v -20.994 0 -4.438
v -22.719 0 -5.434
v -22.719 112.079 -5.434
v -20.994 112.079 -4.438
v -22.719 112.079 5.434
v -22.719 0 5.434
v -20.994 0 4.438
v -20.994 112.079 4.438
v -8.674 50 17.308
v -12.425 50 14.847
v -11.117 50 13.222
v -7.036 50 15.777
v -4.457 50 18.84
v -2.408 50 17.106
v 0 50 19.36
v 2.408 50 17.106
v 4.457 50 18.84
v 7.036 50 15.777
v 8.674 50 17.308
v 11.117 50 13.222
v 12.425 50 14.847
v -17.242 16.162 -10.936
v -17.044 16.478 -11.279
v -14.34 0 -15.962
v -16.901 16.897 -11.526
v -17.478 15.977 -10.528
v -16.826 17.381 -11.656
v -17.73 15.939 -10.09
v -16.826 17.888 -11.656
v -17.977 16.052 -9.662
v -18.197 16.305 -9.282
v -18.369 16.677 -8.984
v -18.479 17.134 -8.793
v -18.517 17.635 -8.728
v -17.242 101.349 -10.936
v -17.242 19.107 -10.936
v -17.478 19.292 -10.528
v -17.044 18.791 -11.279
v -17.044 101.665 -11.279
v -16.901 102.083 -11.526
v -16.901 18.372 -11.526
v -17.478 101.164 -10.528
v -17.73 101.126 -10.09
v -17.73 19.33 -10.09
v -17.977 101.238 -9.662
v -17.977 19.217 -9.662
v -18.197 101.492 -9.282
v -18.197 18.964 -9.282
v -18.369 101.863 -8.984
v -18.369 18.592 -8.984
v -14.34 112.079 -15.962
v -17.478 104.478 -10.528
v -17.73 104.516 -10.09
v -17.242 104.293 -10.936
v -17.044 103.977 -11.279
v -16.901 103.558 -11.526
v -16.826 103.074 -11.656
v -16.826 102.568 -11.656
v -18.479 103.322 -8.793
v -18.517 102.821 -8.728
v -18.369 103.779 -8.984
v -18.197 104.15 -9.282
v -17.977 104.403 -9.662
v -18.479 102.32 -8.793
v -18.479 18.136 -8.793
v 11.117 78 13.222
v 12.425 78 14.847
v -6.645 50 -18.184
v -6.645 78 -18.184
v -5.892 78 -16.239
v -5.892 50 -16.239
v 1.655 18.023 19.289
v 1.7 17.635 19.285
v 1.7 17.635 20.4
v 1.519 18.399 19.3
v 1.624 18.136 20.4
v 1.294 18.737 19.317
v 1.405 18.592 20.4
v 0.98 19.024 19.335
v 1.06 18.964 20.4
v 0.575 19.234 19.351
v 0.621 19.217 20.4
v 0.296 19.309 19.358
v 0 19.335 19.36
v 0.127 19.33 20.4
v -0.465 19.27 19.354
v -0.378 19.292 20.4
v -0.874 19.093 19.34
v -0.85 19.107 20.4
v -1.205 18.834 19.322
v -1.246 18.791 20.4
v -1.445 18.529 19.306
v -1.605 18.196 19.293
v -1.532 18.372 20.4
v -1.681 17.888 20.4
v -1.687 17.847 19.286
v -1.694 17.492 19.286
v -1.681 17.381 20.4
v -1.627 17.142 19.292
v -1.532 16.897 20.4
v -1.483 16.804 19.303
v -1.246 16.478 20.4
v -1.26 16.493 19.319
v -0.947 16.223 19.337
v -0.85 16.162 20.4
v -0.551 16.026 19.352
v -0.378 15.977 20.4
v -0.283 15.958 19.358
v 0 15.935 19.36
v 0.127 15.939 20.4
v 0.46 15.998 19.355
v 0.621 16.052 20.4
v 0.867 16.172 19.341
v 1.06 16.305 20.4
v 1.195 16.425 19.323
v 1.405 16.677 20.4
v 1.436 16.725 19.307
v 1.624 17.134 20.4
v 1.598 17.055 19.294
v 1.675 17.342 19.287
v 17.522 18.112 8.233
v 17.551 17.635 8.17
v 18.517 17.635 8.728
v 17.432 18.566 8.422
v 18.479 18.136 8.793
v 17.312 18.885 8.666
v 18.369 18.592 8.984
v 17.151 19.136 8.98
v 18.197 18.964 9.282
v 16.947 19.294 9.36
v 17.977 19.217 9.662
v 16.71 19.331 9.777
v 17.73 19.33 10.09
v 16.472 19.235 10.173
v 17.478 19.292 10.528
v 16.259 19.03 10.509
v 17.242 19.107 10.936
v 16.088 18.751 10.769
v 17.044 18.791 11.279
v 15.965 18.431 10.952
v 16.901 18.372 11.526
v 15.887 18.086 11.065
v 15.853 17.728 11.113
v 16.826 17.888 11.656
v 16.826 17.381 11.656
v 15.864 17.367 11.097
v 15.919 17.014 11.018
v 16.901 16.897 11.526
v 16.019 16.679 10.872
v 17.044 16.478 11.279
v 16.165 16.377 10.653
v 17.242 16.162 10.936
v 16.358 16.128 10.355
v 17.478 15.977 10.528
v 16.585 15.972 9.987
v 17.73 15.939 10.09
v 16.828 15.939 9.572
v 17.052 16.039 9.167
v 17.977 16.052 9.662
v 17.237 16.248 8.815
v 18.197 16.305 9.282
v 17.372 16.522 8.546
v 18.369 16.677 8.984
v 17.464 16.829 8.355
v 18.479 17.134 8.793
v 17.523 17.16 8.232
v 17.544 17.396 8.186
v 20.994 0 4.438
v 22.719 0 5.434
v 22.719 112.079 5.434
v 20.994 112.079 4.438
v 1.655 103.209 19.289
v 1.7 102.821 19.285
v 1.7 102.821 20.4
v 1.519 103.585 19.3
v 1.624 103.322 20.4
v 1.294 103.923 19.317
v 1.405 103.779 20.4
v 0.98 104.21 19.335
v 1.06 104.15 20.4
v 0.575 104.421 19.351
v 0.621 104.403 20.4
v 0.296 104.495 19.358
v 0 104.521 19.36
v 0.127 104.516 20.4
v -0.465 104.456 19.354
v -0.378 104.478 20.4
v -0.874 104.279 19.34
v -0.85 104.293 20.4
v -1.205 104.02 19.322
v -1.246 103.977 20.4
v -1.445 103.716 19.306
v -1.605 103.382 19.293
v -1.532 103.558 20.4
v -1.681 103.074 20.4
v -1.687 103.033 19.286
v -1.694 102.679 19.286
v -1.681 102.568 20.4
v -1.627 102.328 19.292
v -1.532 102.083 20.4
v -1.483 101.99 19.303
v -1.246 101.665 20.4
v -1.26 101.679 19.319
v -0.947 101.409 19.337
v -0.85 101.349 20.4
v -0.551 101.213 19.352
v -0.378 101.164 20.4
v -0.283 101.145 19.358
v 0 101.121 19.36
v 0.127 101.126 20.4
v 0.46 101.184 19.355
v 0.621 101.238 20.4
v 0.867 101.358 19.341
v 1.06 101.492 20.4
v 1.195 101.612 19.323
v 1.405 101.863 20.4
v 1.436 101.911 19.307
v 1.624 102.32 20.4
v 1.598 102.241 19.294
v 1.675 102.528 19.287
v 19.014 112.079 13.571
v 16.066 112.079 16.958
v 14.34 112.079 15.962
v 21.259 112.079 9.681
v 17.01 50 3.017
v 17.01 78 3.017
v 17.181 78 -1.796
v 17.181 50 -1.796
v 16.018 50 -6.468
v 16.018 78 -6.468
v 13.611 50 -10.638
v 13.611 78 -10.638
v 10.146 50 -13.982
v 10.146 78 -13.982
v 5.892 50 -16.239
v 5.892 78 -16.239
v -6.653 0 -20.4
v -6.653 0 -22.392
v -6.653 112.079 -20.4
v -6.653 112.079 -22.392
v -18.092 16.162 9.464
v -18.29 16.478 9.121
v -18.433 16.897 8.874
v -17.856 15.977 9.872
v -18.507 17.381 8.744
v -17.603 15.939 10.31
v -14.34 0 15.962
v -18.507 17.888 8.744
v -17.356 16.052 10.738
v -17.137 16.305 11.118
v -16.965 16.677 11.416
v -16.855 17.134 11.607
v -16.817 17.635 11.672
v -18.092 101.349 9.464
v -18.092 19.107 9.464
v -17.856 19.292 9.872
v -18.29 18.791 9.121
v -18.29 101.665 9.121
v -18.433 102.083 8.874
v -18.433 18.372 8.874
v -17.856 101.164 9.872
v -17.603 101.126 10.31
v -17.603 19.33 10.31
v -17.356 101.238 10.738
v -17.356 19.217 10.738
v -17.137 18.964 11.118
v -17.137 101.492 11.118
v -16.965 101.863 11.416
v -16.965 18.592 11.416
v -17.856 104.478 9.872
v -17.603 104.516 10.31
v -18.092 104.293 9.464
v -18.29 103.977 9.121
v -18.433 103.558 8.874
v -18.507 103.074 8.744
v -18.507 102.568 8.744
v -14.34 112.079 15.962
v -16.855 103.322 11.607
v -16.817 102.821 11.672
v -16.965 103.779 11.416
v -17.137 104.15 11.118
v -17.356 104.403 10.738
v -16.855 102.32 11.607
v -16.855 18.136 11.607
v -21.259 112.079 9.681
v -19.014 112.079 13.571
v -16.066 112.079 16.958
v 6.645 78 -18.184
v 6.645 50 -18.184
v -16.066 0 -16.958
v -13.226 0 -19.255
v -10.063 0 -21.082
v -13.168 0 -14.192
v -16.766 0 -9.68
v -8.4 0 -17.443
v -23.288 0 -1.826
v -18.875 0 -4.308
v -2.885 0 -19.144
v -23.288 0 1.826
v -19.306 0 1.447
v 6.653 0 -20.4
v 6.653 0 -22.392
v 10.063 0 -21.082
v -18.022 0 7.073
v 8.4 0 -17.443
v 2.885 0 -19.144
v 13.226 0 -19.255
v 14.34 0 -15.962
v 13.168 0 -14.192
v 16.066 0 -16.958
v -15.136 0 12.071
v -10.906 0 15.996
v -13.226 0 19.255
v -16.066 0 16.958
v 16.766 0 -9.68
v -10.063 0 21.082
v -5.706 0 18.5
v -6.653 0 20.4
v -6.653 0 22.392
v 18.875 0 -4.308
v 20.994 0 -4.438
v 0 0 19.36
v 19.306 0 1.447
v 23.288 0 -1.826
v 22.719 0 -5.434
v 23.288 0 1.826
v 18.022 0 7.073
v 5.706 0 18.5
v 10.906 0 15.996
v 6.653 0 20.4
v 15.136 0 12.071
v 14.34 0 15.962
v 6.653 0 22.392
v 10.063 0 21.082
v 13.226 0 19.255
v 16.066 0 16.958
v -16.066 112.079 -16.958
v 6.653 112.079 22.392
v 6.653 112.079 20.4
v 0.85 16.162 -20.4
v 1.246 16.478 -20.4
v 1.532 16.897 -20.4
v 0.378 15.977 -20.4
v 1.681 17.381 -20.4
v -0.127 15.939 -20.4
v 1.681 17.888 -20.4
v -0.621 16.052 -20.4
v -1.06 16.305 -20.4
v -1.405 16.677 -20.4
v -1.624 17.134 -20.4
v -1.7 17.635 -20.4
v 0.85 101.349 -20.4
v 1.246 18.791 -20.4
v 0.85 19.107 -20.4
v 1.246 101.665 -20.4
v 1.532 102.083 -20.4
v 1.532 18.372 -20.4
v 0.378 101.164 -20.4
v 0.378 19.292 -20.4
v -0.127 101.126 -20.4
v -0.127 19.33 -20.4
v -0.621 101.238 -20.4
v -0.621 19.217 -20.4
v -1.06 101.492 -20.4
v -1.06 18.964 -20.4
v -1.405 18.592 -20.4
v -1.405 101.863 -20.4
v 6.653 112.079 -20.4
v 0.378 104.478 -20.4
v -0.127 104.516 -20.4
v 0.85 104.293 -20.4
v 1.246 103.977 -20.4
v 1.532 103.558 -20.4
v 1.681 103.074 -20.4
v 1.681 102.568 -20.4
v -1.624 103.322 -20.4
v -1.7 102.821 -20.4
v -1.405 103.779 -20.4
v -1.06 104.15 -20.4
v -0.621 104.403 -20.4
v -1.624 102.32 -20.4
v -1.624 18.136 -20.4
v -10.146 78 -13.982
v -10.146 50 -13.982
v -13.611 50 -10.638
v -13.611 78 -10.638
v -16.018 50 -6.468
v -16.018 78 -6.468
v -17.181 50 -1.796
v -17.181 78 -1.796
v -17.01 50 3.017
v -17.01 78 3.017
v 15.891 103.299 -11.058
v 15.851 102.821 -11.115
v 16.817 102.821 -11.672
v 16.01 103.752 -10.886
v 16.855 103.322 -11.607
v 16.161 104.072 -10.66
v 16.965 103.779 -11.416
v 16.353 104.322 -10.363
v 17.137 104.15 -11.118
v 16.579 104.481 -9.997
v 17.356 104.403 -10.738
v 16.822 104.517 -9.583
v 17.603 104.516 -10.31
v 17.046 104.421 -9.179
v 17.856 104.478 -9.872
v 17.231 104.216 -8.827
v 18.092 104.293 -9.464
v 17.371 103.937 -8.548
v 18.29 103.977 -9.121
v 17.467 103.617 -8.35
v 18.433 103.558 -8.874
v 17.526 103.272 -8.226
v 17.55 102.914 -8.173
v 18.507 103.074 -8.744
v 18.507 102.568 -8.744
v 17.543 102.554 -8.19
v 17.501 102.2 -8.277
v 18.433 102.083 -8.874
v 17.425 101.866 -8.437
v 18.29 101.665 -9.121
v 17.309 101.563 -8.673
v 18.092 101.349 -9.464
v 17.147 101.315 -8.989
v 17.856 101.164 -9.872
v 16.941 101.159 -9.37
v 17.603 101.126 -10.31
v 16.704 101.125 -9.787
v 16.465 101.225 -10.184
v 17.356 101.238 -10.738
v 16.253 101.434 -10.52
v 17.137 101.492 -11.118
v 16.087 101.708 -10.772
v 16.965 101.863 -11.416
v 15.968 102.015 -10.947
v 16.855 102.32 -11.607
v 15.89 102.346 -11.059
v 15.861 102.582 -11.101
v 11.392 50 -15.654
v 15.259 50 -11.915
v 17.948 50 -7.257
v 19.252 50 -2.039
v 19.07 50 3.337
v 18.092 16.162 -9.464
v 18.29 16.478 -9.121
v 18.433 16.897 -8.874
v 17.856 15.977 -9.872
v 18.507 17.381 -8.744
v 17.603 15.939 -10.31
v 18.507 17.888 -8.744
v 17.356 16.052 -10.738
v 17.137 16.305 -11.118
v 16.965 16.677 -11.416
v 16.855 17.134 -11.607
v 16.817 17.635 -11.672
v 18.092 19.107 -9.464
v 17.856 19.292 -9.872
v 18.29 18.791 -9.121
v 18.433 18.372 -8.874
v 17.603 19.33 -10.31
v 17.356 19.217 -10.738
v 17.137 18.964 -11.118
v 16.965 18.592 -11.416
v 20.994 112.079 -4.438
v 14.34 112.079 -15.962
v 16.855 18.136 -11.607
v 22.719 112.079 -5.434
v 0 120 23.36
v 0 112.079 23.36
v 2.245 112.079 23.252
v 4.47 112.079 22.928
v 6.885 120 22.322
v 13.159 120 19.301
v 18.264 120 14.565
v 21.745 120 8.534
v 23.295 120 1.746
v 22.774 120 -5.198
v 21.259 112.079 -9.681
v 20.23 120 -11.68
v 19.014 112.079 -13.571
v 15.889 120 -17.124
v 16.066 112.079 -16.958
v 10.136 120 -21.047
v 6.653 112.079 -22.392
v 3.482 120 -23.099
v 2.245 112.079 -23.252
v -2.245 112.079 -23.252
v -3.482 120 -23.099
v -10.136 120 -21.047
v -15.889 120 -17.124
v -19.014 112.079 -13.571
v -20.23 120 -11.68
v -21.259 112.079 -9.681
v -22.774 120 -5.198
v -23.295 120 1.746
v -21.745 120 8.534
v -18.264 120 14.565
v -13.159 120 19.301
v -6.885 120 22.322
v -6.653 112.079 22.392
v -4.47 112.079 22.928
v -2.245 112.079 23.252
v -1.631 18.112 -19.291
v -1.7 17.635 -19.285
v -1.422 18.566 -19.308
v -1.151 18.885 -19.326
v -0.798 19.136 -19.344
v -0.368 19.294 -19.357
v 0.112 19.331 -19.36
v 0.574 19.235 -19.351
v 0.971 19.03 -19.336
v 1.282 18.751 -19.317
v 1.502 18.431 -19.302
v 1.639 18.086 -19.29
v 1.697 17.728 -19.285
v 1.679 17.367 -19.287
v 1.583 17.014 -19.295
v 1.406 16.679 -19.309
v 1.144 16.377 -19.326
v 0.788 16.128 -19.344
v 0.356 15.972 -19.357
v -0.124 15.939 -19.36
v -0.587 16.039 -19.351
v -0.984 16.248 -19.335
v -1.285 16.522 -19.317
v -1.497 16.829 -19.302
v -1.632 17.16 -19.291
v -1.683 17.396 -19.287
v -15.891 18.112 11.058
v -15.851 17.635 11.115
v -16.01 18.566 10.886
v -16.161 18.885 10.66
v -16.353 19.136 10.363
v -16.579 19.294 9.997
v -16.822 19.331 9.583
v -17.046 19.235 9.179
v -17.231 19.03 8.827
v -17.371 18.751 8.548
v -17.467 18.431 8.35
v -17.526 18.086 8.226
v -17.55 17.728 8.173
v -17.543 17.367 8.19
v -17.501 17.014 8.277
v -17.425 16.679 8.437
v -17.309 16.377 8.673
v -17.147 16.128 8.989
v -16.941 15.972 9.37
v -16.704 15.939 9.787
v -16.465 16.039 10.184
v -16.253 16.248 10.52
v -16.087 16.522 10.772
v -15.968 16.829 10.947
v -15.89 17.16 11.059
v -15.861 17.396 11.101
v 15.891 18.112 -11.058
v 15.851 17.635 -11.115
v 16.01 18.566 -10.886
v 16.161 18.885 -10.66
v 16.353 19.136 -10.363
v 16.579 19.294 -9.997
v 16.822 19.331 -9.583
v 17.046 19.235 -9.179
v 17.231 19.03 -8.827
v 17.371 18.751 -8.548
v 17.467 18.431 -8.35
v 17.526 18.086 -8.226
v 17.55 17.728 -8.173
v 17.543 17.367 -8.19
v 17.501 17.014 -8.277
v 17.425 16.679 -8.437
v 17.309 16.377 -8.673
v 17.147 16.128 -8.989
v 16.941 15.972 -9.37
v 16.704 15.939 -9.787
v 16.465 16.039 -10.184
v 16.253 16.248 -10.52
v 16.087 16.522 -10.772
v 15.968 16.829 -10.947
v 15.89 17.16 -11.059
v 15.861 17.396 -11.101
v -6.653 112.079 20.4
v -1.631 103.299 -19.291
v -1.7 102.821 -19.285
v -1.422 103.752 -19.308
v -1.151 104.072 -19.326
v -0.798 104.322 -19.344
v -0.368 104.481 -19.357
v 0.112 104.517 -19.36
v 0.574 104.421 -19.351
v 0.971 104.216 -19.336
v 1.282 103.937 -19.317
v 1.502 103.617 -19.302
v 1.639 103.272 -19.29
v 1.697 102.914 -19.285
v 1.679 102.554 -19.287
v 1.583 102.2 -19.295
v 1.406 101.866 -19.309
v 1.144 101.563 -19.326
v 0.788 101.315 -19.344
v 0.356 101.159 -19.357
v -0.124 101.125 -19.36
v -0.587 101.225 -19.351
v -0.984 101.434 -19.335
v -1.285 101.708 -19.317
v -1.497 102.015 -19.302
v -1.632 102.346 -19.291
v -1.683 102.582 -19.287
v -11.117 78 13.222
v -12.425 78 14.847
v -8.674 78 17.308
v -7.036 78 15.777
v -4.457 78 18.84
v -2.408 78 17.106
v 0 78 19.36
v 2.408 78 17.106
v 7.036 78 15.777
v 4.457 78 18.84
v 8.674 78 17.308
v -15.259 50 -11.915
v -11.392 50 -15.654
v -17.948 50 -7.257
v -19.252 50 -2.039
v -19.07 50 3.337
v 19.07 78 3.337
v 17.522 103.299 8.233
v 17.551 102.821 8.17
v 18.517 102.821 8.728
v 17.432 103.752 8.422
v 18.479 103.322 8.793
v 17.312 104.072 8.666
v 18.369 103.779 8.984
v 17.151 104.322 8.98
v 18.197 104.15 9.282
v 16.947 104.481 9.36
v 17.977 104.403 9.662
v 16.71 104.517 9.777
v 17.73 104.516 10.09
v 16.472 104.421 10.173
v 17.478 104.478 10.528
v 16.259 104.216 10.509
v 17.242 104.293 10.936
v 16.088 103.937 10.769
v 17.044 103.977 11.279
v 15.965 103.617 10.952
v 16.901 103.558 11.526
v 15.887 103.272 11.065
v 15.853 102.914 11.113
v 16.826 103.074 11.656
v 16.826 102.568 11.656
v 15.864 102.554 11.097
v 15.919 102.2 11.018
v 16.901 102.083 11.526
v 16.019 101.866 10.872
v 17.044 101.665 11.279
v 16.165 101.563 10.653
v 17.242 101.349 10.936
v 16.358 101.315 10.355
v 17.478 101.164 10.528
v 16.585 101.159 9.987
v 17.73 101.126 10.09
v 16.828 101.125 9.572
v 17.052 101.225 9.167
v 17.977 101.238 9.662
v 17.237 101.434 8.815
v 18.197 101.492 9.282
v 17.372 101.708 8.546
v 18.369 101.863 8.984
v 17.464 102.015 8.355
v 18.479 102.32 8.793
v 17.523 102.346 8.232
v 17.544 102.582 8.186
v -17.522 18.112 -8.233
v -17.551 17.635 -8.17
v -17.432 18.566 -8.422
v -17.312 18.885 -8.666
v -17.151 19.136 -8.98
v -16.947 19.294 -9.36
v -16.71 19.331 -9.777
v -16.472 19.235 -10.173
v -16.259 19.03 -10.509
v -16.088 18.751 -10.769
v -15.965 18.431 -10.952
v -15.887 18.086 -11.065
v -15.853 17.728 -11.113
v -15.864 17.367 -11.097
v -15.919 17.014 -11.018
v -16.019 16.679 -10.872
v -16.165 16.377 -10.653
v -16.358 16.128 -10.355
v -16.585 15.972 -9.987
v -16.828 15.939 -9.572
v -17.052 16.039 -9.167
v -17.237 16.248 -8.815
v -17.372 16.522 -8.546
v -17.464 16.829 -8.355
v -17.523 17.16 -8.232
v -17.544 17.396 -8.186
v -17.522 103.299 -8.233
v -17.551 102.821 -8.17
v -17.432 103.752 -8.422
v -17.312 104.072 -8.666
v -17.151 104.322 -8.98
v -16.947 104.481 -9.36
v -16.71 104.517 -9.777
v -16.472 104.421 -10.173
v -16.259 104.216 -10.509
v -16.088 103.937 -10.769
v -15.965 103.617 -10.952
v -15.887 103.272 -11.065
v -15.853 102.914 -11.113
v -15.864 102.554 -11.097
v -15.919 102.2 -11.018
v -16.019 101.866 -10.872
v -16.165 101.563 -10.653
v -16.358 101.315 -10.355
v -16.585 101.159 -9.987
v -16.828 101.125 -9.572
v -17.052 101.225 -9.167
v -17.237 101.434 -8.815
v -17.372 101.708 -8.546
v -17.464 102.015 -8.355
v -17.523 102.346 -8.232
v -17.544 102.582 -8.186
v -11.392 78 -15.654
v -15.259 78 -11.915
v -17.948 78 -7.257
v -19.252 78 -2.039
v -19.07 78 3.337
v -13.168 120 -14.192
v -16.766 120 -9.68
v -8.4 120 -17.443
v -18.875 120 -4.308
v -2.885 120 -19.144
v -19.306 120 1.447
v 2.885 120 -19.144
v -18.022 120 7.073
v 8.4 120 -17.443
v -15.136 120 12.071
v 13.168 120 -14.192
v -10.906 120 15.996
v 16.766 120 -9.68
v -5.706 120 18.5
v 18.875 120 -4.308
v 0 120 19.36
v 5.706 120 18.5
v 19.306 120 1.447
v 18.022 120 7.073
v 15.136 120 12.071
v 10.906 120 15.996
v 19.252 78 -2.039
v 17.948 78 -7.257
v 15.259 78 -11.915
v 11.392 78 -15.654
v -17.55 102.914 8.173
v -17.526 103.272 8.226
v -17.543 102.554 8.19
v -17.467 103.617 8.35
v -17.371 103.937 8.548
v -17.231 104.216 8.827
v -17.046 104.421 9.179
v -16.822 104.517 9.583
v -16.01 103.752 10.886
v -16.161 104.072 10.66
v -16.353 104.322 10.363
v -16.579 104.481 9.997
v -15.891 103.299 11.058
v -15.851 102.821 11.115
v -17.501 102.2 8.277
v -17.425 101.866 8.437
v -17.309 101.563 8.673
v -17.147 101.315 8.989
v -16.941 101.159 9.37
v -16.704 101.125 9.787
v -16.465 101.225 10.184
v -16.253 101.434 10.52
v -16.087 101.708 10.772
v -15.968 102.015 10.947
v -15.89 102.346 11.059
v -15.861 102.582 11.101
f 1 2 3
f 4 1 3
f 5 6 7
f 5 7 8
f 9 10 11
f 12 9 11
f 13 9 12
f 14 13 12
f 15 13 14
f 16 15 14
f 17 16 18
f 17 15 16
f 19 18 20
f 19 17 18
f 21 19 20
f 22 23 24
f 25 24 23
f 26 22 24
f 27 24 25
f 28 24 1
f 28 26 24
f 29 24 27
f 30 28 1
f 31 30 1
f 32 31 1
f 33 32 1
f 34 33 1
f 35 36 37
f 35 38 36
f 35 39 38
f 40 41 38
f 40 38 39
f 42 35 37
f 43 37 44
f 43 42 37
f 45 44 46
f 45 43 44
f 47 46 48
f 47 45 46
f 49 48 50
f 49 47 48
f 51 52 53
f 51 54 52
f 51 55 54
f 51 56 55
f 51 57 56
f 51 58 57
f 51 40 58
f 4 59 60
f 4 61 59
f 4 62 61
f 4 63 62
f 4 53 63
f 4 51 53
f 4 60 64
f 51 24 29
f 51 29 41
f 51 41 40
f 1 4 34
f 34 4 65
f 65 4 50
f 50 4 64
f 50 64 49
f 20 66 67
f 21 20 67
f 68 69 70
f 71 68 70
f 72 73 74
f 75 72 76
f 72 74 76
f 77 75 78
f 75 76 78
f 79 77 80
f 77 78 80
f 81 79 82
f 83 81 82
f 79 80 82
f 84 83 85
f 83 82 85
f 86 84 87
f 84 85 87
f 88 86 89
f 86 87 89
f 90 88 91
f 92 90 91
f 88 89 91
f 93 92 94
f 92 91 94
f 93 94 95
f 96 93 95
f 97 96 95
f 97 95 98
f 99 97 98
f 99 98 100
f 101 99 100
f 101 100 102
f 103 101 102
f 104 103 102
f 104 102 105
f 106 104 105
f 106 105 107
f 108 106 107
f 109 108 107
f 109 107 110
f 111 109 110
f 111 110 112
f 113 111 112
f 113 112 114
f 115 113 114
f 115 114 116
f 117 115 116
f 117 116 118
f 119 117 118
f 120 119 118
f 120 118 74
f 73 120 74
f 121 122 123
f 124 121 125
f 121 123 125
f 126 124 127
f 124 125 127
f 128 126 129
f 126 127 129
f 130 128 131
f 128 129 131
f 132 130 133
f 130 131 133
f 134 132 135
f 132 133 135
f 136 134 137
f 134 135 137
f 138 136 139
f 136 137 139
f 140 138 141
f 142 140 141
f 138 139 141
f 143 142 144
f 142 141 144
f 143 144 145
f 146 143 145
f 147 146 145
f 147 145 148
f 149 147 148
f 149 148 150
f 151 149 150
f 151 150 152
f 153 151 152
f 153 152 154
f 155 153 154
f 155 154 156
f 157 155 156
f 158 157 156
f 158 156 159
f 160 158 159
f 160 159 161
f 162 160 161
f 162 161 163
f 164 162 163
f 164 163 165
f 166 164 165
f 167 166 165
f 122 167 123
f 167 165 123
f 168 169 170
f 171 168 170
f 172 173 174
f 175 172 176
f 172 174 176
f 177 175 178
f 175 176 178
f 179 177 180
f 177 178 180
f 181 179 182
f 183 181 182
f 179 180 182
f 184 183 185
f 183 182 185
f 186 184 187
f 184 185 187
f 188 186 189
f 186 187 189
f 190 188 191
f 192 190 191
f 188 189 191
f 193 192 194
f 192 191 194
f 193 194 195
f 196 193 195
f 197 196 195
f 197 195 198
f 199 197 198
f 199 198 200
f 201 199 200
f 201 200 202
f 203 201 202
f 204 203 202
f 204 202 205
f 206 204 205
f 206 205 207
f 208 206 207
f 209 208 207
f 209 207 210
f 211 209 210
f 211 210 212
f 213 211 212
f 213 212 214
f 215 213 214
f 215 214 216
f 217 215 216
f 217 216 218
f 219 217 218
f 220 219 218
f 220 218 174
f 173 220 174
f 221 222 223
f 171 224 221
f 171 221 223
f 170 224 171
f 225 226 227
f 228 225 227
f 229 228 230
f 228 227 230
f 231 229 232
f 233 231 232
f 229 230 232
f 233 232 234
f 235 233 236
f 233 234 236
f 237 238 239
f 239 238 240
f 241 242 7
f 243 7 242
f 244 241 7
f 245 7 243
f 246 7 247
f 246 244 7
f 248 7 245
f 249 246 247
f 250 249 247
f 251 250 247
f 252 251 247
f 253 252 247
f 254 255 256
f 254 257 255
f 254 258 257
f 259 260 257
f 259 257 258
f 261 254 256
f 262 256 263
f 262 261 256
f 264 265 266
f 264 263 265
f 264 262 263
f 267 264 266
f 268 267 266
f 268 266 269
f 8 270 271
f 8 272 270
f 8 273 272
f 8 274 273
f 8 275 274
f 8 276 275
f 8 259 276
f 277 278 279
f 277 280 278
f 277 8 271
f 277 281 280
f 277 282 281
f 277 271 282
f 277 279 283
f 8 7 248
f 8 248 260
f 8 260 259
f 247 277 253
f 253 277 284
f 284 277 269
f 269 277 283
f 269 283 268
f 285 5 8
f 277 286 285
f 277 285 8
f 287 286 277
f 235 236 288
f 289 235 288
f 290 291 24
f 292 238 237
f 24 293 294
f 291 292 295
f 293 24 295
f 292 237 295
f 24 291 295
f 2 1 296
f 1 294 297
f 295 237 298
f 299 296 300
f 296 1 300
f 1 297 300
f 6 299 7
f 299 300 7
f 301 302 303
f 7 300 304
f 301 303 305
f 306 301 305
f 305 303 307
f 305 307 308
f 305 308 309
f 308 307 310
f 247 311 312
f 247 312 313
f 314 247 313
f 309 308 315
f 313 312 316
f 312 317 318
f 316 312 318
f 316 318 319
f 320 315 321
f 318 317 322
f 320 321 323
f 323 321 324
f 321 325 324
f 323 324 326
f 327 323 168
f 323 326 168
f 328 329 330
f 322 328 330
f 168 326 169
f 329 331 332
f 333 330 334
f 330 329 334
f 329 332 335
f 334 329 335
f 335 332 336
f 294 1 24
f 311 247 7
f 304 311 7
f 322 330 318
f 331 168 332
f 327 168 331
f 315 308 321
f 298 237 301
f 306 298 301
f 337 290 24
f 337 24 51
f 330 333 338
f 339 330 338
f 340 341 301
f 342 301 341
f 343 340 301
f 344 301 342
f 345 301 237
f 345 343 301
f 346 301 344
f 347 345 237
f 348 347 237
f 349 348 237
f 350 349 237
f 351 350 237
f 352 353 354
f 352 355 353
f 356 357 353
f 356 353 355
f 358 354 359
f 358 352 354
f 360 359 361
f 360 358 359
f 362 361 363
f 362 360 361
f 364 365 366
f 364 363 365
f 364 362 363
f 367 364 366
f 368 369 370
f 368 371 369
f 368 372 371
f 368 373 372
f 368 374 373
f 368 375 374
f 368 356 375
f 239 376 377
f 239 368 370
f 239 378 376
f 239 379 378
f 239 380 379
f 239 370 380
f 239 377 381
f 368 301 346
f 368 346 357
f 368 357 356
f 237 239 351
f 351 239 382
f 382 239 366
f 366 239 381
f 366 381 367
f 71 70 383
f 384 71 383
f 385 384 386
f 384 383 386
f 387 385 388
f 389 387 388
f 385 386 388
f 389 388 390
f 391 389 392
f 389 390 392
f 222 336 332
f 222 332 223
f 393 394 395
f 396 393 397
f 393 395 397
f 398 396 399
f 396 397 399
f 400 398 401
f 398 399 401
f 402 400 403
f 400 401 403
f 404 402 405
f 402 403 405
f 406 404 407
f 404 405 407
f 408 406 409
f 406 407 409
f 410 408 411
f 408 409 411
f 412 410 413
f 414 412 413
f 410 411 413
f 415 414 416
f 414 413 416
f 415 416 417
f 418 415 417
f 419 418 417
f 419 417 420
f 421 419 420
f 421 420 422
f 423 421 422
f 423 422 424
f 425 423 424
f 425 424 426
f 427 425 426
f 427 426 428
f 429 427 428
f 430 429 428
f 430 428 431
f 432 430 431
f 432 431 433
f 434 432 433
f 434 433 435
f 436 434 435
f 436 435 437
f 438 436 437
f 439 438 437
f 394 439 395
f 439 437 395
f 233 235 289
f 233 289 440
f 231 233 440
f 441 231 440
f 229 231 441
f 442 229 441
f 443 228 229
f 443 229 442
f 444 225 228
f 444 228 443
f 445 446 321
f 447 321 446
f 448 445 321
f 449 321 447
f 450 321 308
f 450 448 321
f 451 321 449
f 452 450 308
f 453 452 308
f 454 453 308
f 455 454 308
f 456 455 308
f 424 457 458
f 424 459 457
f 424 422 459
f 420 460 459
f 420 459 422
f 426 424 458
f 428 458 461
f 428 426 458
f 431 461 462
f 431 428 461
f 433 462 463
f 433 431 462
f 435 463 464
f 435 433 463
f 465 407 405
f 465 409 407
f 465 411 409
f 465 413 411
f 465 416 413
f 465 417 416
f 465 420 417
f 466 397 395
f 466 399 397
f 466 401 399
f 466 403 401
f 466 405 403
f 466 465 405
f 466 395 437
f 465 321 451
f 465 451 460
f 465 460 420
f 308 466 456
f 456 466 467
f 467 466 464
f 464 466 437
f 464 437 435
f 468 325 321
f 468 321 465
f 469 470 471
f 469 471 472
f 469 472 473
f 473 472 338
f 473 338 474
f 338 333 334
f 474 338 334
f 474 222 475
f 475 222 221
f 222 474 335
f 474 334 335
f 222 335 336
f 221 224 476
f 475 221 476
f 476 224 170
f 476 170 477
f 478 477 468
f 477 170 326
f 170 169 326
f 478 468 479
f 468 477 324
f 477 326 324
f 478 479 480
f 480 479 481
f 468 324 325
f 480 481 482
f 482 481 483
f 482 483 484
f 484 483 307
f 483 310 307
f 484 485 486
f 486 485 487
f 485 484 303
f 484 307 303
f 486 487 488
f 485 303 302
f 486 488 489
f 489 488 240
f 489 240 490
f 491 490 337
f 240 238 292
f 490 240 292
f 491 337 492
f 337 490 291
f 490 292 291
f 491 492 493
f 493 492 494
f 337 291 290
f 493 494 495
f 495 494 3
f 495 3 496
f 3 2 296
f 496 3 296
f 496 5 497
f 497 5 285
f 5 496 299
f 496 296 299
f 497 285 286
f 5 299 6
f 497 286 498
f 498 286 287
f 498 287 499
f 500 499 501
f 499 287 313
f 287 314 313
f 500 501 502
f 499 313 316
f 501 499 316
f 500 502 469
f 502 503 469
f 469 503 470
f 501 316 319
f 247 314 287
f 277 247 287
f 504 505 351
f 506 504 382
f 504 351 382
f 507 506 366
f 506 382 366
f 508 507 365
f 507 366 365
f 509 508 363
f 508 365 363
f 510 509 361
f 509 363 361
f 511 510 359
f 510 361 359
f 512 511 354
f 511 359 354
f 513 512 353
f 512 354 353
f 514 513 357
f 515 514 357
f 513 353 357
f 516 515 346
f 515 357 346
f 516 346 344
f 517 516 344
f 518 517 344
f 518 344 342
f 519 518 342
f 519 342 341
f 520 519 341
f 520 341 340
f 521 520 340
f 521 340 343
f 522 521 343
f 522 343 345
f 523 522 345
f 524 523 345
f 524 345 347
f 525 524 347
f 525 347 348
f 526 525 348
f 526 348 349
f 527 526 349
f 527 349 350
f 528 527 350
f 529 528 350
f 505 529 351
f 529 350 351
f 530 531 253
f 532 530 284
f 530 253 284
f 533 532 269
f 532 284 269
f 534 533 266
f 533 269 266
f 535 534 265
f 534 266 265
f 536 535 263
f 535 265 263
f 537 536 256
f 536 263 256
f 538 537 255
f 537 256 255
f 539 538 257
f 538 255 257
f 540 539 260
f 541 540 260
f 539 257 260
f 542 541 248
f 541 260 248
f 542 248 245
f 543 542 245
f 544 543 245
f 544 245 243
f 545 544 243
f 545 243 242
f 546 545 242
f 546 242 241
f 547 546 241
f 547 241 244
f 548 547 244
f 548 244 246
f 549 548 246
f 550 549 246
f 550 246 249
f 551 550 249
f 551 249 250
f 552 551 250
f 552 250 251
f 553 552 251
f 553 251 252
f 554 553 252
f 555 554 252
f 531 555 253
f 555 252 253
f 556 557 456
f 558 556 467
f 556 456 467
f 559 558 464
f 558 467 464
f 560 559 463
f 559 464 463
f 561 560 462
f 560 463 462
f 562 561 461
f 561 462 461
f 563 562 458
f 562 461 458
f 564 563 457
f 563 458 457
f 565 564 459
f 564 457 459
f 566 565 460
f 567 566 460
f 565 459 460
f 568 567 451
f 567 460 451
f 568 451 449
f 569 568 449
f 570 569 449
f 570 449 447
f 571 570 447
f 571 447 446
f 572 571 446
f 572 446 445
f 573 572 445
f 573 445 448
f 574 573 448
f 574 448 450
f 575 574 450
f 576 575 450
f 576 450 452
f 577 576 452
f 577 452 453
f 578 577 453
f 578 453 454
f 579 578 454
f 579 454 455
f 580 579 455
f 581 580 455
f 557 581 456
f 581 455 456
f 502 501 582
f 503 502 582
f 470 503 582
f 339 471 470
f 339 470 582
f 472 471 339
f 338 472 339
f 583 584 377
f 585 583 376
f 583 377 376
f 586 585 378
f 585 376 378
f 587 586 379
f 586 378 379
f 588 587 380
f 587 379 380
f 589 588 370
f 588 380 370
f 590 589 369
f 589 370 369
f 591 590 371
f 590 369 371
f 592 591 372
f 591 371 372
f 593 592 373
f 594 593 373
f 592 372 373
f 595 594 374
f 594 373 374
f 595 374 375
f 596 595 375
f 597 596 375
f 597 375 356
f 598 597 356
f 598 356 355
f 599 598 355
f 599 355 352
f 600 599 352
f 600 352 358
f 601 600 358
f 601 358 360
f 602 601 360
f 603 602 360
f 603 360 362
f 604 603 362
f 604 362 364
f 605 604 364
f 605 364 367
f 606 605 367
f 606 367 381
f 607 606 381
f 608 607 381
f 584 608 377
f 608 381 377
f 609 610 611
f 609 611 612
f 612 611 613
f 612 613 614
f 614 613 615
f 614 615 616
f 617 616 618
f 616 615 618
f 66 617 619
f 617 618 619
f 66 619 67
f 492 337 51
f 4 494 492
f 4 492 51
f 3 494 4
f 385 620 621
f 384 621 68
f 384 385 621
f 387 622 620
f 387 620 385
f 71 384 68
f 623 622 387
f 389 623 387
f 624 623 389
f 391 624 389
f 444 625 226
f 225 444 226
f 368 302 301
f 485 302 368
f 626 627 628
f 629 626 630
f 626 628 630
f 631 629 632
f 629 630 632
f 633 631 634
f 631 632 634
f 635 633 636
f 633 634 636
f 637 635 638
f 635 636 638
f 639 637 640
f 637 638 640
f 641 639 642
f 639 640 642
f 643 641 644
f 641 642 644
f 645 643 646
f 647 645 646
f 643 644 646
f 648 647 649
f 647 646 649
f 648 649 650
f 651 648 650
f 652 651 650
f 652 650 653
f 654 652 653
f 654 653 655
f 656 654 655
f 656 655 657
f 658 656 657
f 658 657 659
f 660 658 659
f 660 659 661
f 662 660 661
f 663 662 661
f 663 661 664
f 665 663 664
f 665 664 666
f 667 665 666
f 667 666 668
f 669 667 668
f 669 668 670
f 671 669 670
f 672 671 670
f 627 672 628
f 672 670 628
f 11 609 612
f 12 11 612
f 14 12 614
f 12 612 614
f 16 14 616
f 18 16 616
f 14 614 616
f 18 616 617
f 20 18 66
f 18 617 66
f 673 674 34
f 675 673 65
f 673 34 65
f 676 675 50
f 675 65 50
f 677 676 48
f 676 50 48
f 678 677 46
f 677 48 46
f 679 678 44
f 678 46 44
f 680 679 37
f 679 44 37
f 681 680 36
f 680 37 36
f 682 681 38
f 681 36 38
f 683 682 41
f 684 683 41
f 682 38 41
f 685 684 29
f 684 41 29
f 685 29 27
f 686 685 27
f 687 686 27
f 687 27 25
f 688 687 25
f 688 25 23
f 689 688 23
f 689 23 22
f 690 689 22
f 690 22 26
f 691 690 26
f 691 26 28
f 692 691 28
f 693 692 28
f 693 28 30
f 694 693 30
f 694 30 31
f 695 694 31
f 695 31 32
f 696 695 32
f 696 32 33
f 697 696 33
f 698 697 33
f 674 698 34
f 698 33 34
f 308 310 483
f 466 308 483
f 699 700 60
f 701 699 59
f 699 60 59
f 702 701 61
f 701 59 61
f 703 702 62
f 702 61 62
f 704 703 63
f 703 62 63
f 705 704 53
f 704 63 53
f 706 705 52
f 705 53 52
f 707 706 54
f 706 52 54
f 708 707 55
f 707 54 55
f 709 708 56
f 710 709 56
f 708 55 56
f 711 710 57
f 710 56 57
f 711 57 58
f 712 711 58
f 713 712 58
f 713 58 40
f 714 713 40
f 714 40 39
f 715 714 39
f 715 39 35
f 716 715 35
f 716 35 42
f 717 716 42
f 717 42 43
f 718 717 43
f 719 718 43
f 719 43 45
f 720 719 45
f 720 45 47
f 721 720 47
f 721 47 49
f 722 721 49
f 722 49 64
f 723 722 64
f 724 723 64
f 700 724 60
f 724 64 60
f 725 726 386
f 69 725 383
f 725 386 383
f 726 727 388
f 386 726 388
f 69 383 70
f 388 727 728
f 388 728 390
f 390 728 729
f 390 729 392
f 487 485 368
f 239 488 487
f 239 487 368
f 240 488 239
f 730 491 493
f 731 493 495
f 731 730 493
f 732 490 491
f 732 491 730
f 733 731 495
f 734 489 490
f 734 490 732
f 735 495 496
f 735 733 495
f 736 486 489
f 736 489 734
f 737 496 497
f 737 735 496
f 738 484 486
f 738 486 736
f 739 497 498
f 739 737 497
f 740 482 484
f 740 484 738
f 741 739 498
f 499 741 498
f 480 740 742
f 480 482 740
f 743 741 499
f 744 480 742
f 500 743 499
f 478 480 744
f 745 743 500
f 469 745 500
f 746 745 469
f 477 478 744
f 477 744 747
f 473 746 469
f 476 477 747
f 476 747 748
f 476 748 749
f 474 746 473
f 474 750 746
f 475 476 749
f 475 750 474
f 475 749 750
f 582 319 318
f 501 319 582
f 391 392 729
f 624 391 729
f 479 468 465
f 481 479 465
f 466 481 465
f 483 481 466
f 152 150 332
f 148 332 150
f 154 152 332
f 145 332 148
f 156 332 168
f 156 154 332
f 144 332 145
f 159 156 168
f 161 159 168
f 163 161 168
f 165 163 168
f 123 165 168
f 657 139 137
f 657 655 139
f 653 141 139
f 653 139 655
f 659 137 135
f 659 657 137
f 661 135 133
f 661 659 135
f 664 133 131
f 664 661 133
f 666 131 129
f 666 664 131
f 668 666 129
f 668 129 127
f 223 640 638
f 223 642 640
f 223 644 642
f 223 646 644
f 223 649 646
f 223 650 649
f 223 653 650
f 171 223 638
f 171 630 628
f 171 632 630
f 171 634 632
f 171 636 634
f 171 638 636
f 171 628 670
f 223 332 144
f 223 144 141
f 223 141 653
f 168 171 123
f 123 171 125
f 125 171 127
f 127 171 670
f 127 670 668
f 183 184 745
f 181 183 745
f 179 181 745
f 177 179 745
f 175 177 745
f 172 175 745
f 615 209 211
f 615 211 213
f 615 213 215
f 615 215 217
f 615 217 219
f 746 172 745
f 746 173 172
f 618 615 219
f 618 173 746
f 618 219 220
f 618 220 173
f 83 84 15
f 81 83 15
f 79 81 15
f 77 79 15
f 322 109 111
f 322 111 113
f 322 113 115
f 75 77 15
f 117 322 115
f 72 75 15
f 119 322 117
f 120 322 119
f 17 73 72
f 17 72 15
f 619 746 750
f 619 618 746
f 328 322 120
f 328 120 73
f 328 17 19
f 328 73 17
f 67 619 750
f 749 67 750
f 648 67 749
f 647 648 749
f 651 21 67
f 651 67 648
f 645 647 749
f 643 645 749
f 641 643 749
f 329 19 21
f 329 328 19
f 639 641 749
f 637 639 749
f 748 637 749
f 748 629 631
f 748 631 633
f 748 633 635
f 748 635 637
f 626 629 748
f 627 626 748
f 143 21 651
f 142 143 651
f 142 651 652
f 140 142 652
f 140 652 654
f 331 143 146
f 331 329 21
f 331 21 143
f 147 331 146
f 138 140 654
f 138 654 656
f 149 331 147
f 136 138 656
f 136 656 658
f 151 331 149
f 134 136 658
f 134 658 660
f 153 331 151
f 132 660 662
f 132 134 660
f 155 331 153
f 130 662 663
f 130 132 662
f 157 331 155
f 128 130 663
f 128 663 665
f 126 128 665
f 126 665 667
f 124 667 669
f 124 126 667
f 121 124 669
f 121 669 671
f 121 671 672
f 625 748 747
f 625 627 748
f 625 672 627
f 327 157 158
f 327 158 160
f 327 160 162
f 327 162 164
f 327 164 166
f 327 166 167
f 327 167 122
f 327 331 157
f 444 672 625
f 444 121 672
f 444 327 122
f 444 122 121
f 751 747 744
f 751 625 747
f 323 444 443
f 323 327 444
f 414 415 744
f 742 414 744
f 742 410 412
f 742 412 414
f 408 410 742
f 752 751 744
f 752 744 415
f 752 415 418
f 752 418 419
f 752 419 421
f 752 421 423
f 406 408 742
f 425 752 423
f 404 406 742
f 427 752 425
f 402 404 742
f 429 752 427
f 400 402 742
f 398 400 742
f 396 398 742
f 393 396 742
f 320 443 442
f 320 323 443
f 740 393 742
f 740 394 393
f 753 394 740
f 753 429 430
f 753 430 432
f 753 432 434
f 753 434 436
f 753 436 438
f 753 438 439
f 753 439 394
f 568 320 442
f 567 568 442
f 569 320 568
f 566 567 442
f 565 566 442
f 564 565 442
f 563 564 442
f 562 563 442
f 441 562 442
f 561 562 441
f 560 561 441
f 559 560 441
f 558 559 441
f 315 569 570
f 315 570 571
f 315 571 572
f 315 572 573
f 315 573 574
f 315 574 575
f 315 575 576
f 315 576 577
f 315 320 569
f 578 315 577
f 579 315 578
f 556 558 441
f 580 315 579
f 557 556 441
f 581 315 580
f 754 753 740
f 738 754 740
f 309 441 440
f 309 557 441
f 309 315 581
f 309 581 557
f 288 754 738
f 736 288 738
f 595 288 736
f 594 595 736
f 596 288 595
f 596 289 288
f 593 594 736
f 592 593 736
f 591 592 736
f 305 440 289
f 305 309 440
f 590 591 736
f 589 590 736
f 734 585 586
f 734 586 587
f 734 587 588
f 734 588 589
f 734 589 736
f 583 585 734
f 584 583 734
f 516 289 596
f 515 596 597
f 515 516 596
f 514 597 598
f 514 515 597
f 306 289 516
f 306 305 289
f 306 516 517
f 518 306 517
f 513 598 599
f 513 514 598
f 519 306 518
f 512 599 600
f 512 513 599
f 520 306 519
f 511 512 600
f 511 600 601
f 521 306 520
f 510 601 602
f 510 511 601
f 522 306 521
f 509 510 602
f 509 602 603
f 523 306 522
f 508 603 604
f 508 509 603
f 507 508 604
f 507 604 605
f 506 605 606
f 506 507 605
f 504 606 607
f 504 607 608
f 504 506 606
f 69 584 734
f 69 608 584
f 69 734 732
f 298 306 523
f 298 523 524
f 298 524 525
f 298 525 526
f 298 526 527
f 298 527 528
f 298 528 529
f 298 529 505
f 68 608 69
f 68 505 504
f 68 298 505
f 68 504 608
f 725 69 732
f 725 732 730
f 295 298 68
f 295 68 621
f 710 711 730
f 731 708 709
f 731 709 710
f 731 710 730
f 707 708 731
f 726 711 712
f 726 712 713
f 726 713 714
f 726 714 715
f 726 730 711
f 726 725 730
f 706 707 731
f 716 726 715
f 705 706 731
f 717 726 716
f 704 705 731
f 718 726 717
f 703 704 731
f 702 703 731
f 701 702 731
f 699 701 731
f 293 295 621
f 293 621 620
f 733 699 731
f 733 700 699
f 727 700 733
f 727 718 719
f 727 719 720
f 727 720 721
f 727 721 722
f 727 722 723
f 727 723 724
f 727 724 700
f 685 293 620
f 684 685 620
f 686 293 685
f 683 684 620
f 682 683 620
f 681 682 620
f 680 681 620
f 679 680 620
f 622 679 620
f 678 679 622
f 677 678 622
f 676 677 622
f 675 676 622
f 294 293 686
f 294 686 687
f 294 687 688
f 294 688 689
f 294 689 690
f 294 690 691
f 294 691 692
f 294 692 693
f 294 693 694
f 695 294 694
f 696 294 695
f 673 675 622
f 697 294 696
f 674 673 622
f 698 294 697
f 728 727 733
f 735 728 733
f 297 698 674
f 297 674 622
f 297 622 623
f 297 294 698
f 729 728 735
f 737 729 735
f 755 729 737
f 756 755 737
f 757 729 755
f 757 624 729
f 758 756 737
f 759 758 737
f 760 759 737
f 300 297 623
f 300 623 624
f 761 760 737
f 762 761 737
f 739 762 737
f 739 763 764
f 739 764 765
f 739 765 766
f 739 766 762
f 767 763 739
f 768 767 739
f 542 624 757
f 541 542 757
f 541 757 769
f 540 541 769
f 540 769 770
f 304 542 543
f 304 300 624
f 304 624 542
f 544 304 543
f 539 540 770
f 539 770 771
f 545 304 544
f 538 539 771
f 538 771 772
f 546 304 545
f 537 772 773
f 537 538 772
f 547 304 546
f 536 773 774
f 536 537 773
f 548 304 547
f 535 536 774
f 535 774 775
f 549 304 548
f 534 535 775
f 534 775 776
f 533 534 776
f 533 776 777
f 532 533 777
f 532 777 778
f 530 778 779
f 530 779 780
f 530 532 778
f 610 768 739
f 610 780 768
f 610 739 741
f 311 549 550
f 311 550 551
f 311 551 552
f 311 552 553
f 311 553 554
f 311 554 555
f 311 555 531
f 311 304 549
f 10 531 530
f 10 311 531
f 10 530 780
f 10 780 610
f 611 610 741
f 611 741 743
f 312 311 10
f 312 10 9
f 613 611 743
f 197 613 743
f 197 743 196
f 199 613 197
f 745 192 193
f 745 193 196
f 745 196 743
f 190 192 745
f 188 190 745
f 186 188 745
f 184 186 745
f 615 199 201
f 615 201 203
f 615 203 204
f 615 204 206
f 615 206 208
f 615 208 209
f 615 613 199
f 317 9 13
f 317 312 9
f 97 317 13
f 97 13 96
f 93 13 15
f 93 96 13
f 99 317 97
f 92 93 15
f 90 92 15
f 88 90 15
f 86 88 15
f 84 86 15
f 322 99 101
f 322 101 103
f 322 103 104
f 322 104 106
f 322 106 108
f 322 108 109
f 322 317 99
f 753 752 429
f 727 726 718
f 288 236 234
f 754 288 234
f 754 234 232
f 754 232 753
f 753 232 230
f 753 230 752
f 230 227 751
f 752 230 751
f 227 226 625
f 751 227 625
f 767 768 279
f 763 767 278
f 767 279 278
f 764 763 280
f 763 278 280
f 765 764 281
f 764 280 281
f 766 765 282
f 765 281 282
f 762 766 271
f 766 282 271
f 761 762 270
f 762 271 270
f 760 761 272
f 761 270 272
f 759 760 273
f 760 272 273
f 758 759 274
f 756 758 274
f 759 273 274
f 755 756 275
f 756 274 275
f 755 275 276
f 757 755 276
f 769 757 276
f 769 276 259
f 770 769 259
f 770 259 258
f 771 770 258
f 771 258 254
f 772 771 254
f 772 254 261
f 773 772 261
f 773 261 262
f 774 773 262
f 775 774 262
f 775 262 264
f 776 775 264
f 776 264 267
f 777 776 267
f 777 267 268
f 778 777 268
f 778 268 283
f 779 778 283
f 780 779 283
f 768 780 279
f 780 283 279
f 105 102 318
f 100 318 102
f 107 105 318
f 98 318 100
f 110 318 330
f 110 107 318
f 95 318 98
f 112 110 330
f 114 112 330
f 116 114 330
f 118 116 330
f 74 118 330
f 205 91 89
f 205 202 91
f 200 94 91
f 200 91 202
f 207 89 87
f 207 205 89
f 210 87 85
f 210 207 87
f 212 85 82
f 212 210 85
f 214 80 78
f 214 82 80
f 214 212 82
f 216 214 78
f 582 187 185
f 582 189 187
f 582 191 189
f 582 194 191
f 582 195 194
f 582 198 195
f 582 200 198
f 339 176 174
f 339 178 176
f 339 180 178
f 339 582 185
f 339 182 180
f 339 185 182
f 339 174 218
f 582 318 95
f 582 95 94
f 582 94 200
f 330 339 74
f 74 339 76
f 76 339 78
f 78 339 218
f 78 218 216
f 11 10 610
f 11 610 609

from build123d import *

# Parameters (mm, degrees)
SKETCH1_R               = 23.36
BOSS_EXTRUDE1_DEPTH     = 120
SHELL1_T                = -4
BOSS_EXTRUDE2_START     = -78
BOSS_EXTRUDE2_DEPTH     = 28
CUT_EXTRUDE2_START      = -3
SKETCH3_W               = 13.306682786
SKETCH3_H               = 112.078747136
CUT_EXTRUDE2_DEPTH      = 3
CIRPATTERN1_COUNT       = 6
CUT_EXTRUDE3_REACH      = 131.848
CUT_EXTRUDE3_END_RADIUS = 19.36
SKETCH4_R               = 1.7
CIRPATTERN2_COUNT       = 6


with BuildPart() as part:
    # Sketch1 → Boss-Extrude1 (new body)
    with BuildSketch(Plane(origin=(0, 0, 0), x_dir=(1, 0, 0), z_dir=(0, 1, 0))):
        with Locations(Location((0, 0, 0), (0, 0, 270))):
            Circle(SKETCH1_R)
    extrude(amount=BOSS_EXTRUDE1_DEPTH)

    # Shell1
    shell1_openings = [part.faces().sort_by_distance(p)[0] for p in [
        (0, 120, 0),
        (0, 0, 0),
    ]]
    offset(amount=SHELL1_T, openings=shell1_openings, kind=Kind.INTERSECTION)

    # Sketch2 → Boss-Extrude2 (add)
    with BuildSketch(Plane.XZ.offset(BOSS_EXTRUDE2_START)):
        with BuildLine():
            Line((-6.645158283, -18.183824444), (-5.892390902, -16.239003125))
            ThreePointArc((-5.892390902, -16.239003125), (-14.960585543, -8.63749809), (-17.00958469, 3.016541352))
            Line((-17.00958469, 3.016541352), (-19.070233048, 3.337036337))
            ThreePointArc((-19.070233048, 3.337036337), (-16.766251817, -9.68), (-6.645158283, -18.183824444))
        make_face()
        with BuildLine():
            ThreePointArc((17.00958469, 3.016541352), (14.960585543, -8.63749809), (5.892390902, -16.239003125))
            Line((5.892390902, -16.239003125), (6.645158283, -18.183824444))
            ThreePointArc((6.645158283, -18.183824444), (16.766251817, -9.68), (19.070233048, 3.337036337))
            Line((19.070233048, 3.337036337), (17.00958469, 3.016541352))
        make_face()
        with BuildLine():
            Line((-12.425074765, 14.846788107), (-11.117193788, 13.222461773))
            ThreePointArc((-11.117193788, 13.222461773), (0, 17.274996181), (11.117193788, 13.222461773))
            Line((11.117193788, 13.222461773), (12.425074765, 14.846788107))
            ThreePointArc((12.425074765, 14.846788107), (0, 19.36), (-12.425074765, 14.846788107))
        make_face()
    extrude(amount=BOSS_EXTRUDE2_DEPTH)

    # Sketch3 → Cut-Extrude2 (cut)
    with BuildSketch(Plane(origin=(0, 0, -26.4), x_dir=(-1, 0, 0), z_dir=(0, 0, -1)).offset(CUT_EXTRUDE2_START)):
        with Locations((0, 56.039373568)):
            Rectangle(SKETCH3_W, SKETCH3_H)
    cut_extrude2 = extrude(amount=-CUT_EXTRUDE2_DEPTH, mode=Mode.SUBTRACT)

    # CirPattern1: Cut-Extrude2 ×6 about axis
    cirpattern1_axis = Axis((0, 0, 0), (0, 1, 0))
    for i in range(1, CIRPATTERN1_COUNT):
        add(cut_extrude2.rotate(cirpattern1_axis, i * 360 / CIRPATTERN1_COUNT), mode=Mode.SUBTRACT)

    # Cut-Extrude3: up to this cylinder (the profile starts outside it)
    cut_extrude3_end = Plane(origin=(0, 60.2277495, 0), z_dir=(0, -1, 0)) * Cylinder(CUT_EXTRUDE3_END_RADIUS, 388.602281, mode=Mode.PRIVATE)
    # Sketch4 → Cut-Extrude3 (cut, up to the surface)
    with BuildSketch(Plane(origin=(0, 0, -20.4), x_dir=(-1, 0, 0), z_dir=(0, 0, -1)), mode=Mode.PRIVATE) as cut_extrude3_sk1:
        with Locations((0, 102.820889633)):
            Circle(SKETCH4_R)
    cut_extrude3_tool1 = extrude(cut_extrude3_sk1.sketch, amount=-CUT_EXTRUDE3_REACH, mode=Mode.PRIVATE) - cut_extrude3_end
    # Sketch4 → Cut-Extrude3 (cut, up to the surface)
    with BuildSketch(Plane(origin=(0, 0, -20.4), x_dir=(-1, 0, 0), z_dir=(0, 0, -1)), mode=Mode.PRIVATE) as cut_extrude3_sk2:
        with Locations((0, 17.634608904)):
            Circle(SKETCH4_R)
    cut_extrude3_tool2 = extrude(cut_extrude3_sk2.sketch, amount=-CUT_EXTRUDE3_REACH, mode=Mode.PRIVATE) - cut_extrude3_end
    cut_extrude3 = cut_extrude3_tool1.solids().sort_by_distance((0, 102.82089, -20.4))[0] + cut_extrude3_tool2.solids().sort_by_distance((0, 17.634609, -20.4))[0]
    add(cut_extrude3, mode=Mode.SUBTRACT)

    # CirPattern2: Cut-Extrude3 ×6 about axis
    cirpattern2_axis = Axis((0, 120, 0), (0, -1, 0))
    for i in range(1, CIRPATTERN2_COUNT):
        add(cut_extrude3.rotate(cirpattern2_axis, i * 360 / CIRPATTERN2_COUNT), mode=Mode.SUBTRACT)


solid = part.part
